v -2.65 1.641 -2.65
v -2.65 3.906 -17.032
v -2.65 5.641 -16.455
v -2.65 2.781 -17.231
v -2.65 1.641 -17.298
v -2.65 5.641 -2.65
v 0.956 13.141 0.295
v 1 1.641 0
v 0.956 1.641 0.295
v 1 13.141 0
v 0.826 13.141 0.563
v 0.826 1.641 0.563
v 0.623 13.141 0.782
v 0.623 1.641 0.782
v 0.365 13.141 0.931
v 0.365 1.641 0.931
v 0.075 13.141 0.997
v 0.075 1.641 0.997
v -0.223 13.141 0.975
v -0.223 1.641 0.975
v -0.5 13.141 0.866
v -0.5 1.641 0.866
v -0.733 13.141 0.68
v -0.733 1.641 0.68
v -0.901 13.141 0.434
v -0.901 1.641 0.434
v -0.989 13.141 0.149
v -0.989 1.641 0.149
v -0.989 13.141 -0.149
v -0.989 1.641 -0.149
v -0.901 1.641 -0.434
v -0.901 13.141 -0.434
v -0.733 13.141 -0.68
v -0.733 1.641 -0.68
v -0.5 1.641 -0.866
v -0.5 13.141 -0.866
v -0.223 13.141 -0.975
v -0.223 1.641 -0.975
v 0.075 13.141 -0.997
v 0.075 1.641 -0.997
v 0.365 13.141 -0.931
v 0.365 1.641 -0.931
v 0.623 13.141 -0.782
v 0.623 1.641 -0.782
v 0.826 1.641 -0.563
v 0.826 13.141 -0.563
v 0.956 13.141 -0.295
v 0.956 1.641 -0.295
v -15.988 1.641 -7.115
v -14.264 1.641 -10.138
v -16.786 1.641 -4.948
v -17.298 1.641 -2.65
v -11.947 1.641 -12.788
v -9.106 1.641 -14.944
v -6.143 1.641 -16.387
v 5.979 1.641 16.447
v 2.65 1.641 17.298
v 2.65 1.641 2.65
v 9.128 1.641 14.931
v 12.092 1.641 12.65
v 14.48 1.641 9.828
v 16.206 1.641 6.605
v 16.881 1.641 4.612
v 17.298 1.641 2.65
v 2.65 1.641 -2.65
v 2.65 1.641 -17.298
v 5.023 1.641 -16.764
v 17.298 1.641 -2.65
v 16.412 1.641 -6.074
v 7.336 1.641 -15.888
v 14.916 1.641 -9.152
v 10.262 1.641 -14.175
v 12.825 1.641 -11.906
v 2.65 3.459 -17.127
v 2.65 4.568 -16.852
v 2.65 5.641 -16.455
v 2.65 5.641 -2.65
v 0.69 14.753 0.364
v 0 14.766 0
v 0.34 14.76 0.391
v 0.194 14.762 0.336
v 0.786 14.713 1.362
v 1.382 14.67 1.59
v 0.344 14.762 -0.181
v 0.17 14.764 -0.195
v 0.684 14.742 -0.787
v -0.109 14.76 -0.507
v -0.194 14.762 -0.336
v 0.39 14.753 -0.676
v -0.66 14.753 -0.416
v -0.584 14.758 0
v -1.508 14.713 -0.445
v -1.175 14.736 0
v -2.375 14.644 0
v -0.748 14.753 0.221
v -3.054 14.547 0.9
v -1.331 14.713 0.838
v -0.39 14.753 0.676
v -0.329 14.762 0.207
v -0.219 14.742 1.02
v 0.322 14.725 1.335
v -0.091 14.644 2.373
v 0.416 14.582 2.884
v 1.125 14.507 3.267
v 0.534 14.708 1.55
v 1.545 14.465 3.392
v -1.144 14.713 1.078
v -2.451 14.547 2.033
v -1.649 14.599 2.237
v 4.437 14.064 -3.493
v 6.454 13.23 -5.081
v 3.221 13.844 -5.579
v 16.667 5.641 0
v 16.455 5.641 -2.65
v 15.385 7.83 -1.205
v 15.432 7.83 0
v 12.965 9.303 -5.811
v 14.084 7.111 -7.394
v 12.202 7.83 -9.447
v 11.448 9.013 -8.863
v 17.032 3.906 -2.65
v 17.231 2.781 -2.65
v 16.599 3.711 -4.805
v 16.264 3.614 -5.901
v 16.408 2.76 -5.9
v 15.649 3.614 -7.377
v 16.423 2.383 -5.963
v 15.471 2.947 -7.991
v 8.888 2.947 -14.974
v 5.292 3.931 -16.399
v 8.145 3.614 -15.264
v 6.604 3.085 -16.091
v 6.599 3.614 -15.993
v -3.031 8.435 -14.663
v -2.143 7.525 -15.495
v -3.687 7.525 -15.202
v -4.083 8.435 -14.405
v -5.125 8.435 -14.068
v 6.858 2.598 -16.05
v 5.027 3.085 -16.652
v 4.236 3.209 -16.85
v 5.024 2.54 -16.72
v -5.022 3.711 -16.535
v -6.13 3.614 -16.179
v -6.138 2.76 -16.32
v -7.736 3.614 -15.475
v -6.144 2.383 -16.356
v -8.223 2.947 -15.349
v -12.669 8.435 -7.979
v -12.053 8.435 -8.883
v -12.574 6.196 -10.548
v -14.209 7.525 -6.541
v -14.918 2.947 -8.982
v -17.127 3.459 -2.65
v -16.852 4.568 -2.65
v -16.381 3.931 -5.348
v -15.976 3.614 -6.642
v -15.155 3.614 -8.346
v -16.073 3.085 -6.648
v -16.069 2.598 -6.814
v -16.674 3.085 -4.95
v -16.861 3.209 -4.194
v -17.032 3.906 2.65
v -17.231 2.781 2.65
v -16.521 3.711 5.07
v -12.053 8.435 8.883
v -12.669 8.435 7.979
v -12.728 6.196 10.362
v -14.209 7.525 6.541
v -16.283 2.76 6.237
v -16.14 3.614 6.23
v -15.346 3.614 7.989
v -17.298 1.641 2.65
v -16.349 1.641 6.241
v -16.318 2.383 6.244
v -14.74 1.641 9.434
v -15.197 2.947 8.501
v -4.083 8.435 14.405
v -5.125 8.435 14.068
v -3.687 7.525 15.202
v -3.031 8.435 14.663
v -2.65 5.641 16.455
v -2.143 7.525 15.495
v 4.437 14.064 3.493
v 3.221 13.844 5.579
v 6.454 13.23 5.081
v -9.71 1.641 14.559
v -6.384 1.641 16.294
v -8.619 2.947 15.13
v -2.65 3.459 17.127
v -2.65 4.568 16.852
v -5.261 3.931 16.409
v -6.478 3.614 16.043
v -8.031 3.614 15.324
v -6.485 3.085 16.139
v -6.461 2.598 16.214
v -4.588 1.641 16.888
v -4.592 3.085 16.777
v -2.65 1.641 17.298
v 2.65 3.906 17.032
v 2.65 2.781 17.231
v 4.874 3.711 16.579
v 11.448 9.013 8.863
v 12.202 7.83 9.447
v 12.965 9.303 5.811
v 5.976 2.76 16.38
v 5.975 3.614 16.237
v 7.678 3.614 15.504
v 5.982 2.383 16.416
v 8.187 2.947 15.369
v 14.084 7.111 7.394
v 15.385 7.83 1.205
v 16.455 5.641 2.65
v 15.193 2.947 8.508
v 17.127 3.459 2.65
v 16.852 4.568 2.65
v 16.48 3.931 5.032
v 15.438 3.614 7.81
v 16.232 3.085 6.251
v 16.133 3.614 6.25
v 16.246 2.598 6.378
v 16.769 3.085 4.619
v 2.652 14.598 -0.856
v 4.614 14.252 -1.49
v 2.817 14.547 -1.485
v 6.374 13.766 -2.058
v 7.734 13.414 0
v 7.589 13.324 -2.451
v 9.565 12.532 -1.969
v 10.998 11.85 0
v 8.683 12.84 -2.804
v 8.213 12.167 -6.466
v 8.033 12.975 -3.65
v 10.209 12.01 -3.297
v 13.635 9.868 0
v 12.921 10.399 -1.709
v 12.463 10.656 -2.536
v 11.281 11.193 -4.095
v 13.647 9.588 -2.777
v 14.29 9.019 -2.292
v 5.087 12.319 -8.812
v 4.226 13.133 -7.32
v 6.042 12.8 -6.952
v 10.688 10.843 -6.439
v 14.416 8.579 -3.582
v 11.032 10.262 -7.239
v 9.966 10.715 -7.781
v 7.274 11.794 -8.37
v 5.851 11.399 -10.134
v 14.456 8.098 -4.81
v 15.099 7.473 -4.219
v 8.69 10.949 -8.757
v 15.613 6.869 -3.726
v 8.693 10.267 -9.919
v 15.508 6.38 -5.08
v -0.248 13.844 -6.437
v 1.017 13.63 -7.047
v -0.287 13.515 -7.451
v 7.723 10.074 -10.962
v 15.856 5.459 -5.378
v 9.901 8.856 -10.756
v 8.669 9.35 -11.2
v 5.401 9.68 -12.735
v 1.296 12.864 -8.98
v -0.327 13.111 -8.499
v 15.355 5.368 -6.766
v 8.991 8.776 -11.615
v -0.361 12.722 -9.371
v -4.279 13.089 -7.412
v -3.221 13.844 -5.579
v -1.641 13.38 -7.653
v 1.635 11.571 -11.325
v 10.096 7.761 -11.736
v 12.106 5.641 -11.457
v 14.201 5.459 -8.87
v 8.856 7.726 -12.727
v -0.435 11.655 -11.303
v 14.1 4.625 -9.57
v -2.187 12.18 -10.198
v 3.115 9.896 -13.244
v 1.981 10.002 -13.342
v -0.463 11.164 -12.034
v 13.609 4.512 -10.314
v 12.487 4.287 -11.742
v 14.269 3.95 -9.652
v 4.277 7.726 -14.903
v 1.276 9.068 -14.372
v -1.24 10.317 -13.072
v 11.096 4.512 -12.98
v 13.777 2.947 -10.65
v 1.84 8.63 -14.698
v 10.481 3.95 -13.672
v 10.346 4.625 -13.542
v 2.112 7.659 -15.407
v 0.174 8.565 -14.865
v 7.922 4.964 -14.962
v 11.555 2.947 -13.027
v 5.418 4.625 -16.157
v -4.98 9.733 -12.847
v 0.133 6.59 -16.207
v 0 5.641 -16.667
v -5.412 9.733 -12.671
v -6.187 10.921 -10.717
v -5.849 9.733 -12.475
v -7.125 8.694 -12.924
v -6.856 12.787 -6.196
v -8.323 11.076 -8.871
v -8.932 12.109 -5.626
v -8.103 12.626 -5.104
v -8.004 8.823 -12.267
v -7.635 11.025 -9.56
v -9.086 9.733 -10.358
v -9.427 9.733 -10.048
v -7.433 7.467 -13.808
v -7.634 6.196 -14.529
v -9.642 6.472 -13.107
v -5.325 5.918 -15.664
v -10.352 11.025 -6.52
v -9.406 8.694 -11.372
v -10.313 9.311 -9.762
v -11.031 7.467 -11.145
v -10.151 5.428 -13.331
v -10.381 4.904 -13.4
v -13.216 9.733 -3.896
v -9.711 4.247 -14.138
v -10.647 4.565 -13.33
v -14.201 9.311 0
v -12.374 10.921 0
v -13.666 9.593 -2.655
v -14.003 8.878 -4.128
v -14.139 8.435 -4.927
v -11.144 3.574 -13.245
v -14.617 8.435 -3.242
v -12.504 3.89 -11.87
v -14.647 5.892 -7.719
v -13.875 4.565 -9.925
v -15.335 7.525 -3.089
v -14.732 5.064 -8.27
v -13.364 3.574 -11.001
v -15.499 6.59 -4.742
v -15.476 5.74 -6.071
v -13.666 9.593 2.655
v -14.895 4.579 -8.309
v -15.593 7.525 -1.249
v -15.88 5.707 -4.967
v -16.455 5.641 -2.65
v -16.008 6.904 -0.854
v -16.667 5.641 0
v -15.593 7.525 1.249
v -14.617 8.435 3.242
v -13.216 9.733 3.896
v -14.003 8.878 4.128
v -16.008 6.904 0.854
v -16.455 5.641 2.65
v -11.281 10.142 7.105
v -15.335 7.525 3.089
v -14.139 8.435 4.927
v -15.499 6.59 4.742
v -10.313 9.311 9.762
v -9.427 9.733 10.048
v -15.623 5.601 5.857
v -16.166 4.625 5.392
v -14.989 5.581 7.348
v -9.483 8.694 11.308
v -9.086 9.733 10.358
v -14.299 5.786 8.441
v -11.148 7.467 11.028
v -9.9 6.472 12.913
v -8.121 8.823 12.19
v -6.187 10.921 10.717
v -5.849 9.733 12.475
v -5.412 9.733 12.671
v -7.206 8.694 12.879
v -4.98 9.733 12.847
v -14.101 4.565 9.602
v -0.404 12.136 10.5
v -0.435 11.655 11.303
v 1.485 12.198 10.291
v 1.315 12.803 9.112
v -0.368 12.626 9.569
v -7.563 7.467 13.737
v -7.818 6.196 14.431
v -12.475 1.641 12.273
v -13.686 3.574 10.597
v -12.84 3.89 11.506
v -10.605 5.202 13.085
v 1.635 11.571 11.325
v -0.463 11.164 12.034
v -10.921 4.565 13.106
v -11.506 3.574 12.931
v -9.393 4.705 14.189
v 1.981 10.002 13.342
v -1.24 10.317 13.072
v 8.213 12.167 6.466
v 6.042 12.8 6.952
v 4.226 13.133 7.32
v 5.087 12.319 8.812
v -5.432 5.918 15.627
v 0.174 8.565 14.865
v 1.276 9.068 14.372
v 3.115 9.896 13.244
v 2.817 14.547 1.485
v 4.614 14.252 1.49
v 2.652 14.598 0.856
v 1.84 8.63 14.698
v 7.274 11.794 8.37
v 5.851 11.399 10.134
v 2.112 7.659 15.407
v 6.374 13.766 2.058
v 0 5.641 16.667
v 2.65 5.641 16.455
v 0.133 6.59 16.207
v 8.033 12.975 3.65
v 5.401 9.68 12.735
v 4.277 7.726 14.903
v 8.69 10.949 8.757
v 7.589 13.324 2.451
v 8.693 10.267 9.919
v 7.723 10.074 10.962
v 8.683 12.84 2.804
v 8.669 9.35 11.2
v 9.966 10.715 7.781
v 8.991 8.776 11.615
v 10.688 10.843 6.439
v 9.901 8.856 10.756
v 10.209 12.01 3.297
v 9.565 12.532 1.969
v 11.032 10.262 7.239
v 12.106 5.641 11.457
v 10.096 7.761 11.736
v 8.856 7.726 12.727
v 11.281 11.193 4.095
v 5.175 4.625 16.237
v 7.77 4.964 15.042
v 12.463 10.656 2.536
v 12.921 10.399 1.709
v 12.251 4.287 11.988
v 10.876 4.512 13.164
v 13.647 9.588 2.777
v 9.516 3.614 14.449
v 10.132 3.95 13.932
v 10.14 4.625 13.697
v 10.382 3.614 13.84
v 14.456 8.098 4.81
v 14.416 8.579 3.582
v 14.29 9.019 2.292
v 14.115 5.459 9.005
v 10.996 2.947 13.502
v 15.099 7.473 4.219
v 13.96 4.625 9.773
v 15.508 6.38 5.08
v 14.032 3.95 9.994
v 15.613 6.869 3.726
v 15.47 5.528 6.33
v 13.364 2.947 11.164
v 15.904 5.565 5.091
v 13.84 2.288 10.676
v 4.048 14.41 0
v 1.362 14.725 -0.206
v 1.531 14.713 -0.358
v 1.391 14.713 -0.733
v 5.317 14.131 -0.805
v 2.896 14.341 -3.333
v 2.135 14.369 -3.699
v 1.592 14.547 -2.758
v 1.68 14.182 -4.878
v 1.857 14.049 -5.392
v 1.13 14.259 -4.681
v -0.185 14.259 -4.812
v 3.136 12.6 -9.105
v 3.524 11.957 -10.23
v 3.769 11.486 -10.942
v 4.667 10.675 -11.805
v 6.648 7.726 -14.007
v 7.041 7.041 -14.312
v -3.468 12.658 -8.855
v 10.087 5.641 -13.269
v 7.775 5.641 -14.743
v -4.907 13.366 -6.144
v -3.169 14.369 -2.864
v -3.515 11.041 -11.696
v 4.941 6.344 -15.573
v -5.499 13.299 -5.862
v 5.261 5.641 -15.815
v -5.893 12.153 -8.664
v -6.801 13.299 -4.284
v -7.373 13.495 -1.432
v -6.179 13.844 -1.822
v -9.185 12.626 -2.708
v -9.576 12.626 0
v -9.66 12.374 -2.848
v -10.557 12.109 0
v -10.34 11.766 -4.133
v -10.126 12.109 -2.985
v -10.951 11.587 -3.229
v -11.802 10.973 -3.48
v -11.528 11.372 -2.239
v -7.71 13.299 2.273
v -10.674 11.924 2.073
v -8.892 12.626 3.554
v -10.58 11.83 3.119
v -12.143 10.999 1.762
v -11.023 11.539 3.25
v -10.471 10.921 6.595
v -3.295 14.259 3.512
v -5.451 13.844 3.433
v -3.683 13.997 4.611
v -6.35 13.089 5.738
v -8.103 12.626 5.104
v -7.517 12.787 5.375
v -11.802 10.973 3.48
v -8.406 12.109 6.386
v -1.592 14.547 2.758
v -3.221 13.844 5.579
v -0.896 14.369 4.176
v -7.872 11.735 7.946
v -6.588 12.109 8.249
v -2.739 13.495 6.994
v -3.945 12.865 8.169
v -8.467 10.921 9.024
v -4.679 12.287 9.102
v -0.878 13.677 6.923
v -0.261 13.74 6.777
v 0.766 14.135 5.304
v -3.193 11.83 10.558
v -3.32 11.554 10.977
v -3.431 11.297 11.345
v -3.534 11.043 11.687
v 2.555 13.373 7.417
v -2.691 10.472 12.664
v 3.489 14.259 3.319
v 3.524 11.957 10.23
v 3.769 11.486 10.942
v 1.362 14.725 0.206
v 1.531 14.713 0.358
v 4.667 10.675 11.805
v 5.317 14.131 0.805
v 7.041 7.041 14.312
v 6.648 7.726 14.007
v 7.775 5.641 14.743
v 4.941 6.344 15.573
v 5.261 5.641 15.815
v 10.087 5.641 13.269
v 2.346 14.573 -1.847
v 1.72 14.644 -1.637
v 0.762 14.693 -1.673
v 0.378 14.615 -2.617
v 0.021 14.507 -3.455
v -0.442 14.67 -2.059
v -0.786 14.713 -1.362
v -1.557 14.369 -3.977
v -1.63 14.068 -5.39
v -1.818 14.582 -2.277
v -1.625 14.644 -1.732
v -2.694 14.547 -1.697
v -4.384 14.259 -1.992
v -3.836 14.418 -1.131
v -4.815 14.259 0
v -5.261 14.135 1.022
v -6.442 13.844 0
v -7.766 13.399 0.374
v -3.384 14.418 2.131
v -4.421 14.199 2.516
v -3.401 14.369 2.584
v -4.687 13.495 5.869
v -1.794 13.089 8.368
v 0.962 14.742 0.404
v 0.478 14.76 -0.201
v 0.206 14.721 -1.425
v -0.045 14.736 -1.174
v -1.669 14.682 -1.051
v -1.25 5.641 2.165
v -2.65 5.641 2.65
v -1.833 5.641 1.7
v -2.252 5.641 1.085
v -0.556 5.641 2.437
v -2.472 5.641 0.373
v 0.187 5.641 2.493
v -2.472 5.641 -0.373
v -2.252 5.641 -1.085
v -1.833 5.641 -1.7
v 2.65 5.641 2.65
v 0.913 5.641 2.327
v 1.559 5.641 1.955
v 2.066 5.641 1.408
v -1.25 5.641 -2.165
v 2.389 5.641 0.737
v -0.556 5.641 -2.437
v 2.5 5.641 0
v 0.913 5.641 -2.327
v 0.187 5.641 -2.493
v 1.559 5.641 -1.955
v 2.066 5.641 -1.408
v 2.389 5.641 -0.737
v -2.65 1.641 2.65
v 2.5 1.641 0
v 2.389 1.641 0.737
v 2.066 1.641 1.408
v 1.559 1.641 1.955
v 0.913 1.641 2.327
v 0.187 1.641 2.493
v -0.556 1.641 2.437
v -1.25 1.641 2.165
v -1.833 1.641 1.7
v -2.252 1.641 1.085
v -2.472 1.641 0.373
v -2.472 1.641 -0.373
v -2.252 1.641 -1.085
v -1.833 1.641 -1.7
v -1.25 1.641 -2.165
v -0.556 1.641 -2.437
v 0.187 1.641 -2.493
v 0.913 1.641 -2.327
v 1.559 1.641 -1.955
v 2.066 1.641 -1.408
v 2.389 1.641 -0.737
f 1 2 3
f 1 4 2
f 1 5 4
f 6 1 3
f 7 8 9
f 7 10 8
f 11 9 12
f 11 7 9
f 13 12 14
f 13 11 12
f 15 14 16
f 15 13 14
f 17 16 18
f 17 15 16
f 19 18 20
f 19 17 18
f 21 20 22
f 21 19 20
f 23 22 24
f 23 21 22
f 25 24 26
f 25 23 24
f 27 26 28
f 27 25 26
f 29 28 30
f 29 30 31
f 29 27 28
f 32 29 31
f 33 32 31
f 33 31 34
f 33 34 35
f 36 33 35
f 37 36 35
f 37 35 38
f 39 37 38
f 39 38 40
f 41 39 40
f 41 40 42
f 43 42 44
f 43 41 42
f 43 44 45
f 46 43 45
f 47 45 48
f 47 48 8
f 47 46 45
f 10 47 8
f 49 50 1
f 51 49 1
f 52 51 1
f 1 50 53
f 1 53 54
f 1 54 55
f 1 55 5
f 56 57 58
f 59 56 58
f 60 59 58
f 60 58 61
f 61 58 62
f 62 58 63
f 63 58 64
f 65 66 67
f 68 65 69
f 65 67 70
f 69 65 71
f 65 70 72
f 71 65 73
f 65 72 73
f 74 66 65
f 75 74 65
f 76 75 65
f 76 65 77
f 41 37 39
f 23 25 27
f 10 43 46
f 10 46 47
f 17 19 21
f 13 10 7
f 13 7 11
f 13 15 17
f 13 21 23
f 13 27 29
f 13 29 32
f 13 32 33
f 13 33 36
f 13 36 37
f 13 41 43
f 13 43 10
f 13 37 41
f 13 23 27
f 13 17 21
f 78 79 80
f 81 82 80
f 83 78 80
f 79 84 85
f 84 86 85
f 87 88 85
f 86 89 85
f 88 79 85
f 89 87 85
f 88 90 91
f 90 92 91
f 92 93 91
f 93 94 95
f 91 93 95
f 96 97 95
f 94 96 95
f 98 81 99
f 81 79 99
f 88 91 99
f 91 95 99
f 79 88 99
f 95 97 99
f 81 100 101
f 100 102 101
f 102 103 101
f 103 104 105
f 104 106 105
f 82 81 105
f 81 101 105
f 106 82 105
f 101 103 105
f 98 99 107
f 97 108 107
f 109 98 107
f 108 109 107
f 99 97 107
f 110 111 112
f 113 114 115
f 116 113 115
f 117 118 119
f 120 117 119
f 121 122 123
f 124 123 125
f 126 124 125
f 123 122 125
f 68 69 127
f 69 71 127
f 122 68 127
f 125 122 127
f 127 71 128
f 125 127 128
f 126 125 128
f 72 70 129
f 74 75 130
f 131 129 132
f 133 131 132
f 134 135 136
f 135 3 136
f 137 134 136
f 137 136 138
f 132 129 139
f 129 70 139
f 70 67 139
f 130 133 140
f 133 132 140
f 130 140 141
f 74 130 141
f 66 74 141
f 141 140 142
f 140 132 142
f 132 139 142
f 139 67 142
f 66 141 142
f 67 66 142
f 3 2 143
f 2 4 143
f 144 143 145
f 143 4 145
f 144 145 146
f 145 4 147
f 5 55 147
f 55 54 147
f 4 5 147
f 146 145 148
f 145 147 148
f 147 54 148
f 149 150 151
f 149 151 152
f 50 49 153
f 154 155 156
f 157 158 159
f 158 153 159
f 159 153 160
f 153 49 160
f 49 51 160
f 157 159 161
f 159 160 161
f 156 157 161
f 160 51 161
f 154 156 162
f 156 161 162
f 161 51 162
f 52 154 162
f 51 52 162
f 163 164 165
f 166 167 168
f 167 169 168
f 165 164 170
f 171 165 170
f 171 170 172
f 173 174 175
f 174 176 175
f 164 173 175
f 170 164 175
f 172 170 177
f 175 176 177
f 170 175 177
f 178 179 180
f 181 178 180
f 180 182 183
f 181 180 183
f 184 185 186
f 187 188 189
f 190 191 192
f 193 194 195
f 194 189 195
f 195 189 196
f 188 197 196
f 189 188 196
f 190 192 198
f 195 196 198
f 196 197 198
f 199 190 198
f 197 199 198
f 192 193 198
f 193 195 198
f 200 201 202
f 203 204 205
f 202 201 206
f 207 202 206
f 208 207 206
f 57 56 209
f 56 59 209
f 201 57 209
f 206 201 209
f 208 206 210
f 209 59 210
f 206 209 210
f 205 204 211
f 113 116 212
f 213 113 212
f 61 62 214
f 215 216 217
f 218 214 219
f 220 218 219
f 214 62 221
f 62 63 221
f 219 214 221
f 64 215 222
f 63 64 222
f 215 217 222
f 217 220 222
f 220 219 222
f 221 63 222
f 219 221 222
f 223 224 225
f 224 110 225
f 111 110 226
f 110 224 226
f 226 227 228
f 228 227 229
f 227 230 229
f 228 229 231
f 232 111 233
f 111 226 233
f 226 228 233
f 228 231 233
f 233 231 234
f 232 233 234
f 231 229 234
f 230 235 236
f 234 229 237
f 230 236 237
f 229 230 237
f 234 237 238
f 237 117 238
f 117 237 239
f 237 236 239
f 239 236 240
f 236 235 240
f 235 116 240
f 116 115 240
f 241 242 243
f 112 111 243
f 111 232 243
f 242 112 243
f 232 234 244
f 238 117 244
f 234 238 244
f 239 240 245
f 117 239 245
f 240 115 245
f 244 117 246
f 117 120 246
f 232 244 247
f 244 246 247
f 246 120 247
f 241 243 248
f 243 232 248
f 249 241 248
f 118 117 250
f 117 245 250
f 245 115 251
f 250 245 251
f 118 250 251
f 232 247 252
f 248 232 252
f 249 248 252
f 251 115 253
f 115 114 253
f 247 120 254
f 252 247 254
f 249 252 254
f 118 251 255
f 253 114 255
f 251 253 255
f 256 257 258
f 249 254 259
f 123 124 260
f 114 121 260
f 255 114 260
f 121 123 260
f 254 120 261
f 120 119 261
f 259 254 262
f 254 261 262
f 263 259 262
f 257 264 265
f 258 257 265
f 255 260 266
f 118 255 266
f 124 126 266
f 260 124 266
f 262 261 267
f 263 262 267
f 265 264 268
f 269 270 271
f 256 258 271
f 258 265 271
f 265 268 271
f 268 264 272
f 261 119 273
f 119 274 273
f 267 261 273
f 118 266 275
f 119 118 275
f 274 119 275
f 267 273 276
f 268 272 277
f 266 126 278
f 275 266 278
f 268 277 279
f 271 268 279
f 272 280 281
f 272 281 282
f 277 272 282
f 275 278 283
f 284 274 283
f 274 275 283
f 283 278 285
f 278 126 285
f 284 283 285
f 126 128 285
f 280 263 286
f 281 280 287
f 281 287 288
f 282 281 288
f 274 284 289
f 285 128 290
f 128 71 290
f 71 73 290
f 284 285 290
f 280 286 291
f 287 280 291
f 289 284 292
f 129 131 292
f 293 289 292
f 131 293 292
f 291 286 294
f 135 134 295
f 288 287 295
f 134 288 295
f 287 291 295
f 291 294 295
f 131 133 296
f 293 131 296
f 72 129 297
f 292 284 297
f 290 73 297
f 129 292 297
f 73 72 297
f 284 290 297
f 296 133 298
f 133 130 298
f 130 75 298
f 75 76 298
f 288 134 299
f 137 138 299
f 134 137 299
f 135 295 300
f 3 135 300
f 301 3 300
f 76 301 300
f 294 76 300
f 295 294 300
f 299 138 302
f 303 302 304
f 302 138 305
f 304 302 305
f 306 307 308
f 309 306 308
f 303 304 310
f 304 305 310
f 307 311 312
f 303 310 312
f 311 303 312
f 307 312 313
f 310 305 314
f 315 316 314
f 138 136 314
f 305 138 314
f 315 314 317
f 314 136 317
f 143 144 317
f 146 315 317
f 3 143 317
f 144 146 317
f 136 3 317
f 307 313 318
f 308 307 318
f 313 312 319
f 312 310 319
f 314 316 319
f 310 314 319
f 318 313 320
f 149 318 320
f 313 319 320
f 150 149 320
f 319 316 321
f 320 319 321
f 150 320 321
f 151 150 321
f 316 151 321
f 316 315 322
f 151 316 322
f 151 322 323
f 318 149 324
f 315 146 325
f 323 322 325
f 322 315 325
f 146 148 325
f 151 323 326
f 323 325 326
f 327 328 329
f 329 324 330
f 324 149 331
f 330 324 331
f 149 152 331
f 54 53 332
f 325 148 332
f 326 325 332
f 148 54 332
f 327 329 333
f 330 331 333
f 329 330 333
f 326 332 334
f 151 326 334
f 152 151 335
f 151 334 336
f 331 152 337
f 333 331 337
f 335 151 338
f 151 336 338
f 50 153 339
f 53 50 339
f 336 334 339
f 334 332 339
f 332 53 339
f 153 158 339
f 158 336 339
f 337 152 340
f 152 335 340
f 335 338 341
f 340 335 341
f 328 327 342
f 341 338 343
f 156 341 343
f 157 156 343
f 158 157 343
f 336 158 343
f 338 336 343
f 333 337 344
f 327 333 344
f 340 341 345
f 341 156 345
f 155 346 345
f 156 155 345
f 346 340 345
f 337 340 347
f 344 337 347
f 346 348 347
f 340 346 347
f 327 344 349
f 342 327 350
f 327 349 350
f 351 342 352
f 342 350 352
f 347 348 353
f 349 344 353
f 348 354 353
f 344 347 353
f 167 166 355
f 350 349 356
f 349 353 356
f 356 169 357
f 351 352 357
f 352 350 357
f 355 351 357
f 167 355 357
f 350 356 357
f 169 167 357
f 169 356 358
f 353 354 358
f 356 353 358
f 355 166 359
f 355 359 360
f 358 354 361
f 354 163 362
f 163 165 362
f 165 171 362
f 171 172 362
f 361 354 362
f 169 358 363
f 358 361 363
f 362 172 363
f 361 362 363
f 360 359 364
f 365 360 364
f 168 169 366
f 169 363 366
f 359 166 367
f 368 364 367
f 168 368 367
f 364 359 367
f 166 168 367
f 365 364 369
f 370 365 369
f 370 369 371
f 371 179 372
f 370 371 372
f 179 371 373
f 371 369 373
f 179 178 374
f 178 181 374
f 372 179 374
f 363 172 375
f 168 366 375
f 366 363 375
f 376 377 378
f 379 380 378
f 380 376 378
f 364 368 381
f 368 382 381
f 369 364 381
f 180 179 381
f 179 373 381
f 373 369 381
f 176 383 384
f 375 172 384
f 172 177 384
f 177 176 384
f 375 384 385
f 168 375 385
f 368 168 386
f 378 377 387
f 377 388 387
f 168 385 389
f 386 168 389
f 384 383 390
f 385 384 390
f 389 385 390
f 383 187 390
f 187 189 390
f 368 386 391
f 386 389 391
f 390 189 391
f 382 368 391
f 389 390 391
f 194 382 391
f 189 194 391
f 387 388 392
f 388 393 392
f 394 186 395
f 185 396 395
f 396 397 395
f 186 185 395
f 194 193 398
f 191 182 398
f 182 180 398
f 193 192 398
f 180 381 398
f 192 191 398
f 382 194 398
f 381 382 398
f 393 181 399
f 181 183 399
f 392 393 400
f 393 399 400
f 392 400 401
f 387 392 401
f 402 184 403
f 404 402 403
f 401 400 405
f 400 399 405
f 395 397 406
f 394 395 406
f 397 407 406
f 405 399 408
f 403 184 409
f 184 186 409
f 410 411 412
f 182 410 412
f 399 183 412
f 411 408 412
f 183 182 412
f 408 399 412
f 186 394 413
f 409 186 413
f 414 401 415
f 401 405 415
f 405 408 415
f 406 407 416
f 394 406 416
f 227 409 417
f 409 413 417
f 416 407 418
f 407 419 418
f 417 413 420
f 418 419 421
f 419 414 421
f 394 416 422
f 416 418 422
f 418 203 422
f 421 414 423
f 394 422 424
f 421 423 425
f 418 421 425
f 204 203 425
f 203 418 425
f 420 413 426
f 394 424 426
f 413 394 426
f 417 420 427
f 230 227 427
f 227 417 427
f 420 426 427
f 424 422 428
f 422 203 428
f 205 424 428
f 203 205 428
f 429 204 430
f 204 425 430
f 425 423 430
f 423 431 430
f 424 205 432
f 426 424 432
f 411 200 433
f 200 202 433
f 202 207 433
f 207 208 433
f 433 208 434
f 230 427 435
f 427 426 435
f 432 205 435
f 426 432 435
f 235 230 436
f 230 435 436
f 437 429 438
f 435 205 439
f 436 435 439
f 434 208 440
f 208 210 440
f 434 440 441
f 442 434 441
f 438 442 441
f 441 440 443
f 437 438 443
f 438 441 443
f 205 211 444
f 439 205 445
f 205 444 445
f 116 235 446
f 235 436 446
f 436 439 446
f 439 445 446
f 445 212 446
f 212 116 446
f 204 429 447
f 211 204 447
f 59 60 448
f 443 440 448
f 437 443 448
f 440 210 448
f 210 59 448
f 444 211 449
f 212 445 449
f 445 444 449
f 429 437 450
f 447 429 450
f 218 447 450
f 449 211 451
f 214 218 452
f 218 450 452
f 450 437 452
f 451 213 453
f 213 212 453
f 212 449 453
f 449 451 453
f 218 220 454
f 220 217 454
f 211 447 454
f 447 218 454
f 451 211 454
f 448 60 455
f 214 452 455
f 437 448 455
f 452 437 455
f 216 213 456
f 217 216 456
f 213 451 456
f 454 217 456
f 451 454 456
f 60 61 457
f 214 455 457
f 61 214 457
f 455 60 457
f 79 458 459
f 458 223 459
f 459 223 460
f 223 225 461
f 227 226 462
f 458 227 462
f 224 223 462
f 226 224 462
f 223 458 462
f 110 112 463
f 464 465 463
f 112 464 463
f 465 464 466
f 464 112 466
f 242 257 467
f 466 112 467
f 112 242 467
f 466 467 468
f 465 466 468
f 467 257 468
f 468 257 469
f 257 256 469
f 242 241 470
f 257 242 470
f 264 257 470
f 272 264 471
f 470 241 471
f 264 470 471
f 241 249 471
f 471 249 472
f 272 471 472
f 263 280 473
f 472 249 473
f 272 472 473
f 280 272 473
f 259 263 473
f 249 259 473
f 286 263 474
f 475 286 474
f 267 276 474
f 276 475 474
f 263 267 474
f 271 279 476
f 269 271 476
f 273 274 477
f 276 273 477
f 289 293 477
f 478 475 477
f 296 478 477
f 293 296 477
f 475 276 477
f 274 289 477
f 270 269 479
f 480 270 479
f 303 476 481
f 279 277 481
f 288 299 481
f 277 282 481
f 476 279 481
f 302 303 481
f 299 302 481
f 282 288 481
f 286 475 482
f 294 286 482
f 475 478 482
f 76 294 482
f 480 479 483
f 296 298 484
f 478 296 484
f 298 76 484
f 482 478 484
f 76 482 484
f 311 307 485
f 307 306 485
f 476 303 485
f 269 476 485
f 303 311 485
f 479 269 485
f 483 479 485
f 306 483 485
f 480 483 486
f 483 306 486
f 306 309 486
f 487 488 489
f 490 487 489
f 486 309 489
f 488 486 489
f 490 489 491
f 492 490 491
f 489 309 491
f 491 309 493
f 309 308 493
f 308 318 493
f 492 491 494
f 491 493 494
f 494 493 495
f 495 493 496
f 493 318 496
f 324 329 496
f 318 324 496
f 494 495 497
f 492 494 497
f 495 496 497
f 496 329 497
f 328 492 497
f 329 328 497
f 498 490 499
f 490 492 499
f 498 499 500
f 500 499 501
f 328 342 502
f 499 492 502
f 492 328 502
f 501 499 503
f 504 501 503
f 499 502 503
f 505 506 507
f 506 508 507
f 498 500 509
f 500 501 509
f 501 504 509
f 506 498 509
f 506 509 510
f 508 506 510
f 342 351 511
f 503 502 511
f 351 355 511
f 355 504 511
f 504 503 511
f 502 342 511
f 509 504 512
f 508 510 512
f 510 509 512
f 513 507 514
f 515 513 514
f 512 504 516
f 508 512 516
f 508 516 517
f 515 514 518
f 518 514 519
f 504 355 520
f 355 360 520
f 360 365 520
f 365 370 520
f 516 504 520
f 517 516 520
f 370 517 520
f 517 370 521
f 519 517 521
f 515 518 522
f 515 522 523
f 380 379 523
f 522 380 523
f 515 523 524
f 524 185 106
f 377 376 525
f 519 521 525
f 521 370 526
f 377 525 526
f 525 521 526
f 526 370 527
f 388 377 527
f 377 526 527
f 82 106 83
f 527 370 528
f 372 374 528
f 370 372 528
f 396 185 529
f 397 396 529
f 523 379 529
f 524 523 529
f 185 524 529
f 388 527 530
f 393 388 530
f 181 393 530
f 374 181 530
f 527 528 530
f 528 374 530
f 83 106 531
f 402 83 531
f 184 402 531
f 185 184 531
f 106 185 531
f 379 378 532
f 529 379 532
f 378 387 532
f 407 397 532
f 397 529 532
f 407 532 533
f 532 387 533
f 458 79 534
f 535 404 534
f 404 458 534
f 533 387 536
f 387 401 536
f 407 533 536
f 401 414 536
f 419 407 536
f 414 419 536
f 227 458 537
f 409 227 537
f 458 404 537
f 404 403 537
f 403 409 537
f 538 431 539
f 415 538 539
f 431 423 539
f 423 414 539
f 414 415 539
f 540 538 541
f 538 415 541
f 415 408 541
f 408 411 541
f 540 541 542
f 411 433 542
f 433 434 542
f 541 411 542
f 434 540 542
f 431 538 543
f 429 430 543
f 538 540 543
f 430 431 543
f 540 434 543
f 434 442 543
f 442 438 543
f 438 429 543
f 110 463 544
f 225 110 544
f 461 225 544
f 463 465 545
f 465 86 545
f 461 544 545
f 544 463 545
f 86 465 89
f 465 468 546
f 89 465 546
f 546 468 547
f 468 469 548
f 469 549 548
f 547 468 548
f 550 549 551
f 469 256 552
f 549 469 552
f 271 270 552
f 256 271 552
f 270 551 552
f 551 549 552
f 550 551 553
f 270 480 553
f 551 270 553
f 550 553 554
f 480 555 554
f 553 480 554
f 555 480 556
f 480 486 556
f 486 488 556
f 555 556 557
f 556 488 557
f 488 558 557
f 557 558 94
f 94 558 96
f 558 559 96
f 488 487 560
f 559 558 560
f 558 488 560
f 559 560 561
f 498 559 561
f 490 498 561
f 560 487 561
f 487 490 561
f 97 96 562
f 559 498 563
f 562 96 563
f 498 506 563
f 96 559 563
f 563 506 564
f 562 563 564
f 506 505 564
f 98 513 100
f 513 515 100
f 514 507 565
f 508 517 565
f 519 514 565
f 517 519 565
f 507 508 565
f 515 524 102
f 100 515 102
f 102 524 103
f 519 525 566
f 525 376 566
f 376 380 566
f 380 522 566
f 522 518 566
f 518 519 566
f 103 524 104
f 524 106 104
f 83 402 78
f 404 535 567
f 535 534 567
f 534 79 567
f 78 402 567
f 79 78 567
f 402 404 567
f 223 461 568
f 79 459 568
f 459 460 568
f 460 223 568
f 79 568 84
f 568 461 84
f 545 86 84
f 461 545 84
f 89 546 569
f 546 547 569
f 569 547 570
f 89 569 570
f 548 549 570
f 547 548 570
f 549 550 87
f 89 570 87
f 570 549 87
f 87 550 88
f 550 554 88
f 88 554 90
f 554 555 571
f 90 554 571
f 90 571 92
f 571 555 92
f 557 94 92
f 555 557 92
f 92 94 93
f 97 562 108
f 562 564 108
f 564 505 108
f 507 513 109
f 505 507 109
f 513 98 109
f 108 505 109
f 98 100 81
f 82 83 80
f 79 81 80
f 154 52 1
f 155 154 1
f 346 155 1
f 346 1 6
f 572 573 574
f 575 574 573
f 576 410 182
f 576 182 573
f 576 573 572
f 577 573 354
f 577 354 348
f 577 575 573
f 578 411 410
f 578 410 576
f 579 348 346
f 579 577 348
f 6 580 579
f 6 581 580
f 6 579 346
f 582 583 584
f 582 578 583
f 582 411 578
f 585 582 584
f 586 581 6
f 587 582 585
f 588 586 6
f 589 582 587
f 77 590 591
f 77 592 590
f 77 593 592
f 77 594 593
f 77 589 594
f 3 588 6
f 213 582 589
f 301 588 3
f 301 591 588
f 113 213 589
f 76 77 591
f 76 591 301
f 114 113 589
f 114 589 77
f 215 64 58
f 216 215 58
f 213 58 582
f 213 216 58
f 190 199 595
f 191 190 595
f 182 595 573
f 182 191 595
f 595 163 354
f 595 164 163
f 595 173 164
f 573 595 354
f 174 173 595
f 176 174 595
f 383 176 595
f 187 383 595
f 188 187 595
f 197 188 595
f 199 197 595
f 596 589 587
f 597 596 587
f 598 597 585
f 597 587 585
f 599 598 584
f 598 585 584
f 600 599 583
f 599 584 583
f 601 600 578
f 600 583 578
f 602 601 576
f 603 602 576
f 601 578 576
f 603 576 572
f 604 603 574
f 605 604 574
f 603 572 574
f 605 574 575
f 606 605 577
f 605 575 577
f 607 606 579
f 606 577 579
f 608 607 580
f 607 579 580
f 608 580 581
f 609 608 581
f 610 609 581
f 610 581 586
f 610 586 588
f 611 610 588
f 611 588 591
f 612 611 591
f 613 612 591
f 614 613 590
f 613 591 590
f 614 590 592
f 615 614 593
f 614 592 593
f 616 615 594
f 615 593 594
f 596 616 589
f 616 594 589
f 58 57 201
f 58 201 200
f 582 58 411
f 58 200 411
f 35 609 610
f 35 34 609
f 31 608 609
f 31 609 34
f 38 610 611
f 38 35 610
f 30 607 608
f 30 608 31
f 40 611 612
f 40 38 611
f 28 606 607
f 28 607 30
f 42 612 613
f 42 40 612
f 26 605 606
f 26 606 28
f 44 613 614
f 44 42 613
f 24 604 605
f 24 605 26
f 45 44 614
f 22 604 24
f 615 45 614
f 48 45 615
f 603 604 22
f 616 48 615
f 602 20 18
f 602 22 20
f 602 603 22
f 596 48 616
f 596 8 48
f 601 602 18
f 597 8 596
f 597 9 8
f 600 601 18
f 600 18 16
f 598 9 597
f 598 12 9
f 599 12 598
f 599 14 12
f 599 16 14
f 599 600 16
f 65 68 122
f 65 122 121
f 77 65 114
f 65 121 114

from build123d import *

# Parameters (mm, degrees)
SCALE1_SCALE_X      = 1
SCALE1_SCALE_Y      = 0.75
SCALE1_SCALE_Z      = 1
SKETCH3_W           = 5.3
SKETCH3_H           = 4
CUT_EXTRUDE1_DEPTH  = 17.5
CIRPATTERN1_COUNT   = 2
CIRPATTERN1_ANGLE   = 90
SKETCH4_R           = 2.5
SKETCH4_R_2         = 1
BOSS_EXTRUDE1_DEPTH = 4
SKETCH5_R           = 1
CUT_EXTRUDE2_DEPTH  = 7.5


with BuildPart() as part:
    # Sketch2 → Revolve1 (revolve)
    with BuildSketch(Plane.XY):
        with BuildLine():
            Line((0, 0), (0, 17.5))
            ThreePointArc((0, 17.5), (12.374368671, 12.374368671), (17.5, 0))
            Line((17.5, 0), (0, 0))
        make_face()
    revolve(axis=Axis((0, 0, 0), (0, 1, 0)))


with BuildPart() as part_1:
    # Scale1: scaled about (0, 6.5625, 0)
    add(part.part.scale((SCALE1_SCALE_X, SCALE1_SCALE_Y, SCALE1_SCALE_Z), about=(0, 6.5625, 0)))

    # Sketch3 → Cut-Extrude1 (cut, symmetric)
    with BuildSketch(Plane.XY):
        with Locations((0, 3.640625)):
            Rectangle(SKETCH3_W, SKETCH3_H)
    cut_extrude1 = extrude(amount=CUT_EXTRUDE1_DEPTH, both=True, mode=Mode.SUBTRACT)

    # CirPattern1: Cut-Extrude1 ×2 about axis
    cirpattern1_axis = Axis((0, 0.984375, 0), (0, 1, 0))
    for i in range(1, CIRPATTERN1_COUNT):
        add(cut_extrude1.rotate(cirpattern1_axis, i * CIRPATTERN1_ANGLE / (CIRPATTERN1_COUNT - 1)), mode=Mode.SUBTRACT)

    # Sketch4 → Boss-Extrude1 (add)
    with BuildSketch(Plane.XZ.offset(-5.640625)):
        Circle(SKETCH4_R)
        Circle(SKETCH4_R_2, mode=Mode.SUBTRACT)
    extrude(amount=BOSS_EXTRUDE1_DEPTH)

    # Sketch5 → Cut-Extrude2 (cut)
    with BuildSketch(Plane.XZ.offset(-5.640625)):
        Circle(SKETCH5_R)
    extrude(amount=-CUT_EXTRUDE2_DEPTH, mode=Mode.SUBTRACT)


solid = part_1.part
